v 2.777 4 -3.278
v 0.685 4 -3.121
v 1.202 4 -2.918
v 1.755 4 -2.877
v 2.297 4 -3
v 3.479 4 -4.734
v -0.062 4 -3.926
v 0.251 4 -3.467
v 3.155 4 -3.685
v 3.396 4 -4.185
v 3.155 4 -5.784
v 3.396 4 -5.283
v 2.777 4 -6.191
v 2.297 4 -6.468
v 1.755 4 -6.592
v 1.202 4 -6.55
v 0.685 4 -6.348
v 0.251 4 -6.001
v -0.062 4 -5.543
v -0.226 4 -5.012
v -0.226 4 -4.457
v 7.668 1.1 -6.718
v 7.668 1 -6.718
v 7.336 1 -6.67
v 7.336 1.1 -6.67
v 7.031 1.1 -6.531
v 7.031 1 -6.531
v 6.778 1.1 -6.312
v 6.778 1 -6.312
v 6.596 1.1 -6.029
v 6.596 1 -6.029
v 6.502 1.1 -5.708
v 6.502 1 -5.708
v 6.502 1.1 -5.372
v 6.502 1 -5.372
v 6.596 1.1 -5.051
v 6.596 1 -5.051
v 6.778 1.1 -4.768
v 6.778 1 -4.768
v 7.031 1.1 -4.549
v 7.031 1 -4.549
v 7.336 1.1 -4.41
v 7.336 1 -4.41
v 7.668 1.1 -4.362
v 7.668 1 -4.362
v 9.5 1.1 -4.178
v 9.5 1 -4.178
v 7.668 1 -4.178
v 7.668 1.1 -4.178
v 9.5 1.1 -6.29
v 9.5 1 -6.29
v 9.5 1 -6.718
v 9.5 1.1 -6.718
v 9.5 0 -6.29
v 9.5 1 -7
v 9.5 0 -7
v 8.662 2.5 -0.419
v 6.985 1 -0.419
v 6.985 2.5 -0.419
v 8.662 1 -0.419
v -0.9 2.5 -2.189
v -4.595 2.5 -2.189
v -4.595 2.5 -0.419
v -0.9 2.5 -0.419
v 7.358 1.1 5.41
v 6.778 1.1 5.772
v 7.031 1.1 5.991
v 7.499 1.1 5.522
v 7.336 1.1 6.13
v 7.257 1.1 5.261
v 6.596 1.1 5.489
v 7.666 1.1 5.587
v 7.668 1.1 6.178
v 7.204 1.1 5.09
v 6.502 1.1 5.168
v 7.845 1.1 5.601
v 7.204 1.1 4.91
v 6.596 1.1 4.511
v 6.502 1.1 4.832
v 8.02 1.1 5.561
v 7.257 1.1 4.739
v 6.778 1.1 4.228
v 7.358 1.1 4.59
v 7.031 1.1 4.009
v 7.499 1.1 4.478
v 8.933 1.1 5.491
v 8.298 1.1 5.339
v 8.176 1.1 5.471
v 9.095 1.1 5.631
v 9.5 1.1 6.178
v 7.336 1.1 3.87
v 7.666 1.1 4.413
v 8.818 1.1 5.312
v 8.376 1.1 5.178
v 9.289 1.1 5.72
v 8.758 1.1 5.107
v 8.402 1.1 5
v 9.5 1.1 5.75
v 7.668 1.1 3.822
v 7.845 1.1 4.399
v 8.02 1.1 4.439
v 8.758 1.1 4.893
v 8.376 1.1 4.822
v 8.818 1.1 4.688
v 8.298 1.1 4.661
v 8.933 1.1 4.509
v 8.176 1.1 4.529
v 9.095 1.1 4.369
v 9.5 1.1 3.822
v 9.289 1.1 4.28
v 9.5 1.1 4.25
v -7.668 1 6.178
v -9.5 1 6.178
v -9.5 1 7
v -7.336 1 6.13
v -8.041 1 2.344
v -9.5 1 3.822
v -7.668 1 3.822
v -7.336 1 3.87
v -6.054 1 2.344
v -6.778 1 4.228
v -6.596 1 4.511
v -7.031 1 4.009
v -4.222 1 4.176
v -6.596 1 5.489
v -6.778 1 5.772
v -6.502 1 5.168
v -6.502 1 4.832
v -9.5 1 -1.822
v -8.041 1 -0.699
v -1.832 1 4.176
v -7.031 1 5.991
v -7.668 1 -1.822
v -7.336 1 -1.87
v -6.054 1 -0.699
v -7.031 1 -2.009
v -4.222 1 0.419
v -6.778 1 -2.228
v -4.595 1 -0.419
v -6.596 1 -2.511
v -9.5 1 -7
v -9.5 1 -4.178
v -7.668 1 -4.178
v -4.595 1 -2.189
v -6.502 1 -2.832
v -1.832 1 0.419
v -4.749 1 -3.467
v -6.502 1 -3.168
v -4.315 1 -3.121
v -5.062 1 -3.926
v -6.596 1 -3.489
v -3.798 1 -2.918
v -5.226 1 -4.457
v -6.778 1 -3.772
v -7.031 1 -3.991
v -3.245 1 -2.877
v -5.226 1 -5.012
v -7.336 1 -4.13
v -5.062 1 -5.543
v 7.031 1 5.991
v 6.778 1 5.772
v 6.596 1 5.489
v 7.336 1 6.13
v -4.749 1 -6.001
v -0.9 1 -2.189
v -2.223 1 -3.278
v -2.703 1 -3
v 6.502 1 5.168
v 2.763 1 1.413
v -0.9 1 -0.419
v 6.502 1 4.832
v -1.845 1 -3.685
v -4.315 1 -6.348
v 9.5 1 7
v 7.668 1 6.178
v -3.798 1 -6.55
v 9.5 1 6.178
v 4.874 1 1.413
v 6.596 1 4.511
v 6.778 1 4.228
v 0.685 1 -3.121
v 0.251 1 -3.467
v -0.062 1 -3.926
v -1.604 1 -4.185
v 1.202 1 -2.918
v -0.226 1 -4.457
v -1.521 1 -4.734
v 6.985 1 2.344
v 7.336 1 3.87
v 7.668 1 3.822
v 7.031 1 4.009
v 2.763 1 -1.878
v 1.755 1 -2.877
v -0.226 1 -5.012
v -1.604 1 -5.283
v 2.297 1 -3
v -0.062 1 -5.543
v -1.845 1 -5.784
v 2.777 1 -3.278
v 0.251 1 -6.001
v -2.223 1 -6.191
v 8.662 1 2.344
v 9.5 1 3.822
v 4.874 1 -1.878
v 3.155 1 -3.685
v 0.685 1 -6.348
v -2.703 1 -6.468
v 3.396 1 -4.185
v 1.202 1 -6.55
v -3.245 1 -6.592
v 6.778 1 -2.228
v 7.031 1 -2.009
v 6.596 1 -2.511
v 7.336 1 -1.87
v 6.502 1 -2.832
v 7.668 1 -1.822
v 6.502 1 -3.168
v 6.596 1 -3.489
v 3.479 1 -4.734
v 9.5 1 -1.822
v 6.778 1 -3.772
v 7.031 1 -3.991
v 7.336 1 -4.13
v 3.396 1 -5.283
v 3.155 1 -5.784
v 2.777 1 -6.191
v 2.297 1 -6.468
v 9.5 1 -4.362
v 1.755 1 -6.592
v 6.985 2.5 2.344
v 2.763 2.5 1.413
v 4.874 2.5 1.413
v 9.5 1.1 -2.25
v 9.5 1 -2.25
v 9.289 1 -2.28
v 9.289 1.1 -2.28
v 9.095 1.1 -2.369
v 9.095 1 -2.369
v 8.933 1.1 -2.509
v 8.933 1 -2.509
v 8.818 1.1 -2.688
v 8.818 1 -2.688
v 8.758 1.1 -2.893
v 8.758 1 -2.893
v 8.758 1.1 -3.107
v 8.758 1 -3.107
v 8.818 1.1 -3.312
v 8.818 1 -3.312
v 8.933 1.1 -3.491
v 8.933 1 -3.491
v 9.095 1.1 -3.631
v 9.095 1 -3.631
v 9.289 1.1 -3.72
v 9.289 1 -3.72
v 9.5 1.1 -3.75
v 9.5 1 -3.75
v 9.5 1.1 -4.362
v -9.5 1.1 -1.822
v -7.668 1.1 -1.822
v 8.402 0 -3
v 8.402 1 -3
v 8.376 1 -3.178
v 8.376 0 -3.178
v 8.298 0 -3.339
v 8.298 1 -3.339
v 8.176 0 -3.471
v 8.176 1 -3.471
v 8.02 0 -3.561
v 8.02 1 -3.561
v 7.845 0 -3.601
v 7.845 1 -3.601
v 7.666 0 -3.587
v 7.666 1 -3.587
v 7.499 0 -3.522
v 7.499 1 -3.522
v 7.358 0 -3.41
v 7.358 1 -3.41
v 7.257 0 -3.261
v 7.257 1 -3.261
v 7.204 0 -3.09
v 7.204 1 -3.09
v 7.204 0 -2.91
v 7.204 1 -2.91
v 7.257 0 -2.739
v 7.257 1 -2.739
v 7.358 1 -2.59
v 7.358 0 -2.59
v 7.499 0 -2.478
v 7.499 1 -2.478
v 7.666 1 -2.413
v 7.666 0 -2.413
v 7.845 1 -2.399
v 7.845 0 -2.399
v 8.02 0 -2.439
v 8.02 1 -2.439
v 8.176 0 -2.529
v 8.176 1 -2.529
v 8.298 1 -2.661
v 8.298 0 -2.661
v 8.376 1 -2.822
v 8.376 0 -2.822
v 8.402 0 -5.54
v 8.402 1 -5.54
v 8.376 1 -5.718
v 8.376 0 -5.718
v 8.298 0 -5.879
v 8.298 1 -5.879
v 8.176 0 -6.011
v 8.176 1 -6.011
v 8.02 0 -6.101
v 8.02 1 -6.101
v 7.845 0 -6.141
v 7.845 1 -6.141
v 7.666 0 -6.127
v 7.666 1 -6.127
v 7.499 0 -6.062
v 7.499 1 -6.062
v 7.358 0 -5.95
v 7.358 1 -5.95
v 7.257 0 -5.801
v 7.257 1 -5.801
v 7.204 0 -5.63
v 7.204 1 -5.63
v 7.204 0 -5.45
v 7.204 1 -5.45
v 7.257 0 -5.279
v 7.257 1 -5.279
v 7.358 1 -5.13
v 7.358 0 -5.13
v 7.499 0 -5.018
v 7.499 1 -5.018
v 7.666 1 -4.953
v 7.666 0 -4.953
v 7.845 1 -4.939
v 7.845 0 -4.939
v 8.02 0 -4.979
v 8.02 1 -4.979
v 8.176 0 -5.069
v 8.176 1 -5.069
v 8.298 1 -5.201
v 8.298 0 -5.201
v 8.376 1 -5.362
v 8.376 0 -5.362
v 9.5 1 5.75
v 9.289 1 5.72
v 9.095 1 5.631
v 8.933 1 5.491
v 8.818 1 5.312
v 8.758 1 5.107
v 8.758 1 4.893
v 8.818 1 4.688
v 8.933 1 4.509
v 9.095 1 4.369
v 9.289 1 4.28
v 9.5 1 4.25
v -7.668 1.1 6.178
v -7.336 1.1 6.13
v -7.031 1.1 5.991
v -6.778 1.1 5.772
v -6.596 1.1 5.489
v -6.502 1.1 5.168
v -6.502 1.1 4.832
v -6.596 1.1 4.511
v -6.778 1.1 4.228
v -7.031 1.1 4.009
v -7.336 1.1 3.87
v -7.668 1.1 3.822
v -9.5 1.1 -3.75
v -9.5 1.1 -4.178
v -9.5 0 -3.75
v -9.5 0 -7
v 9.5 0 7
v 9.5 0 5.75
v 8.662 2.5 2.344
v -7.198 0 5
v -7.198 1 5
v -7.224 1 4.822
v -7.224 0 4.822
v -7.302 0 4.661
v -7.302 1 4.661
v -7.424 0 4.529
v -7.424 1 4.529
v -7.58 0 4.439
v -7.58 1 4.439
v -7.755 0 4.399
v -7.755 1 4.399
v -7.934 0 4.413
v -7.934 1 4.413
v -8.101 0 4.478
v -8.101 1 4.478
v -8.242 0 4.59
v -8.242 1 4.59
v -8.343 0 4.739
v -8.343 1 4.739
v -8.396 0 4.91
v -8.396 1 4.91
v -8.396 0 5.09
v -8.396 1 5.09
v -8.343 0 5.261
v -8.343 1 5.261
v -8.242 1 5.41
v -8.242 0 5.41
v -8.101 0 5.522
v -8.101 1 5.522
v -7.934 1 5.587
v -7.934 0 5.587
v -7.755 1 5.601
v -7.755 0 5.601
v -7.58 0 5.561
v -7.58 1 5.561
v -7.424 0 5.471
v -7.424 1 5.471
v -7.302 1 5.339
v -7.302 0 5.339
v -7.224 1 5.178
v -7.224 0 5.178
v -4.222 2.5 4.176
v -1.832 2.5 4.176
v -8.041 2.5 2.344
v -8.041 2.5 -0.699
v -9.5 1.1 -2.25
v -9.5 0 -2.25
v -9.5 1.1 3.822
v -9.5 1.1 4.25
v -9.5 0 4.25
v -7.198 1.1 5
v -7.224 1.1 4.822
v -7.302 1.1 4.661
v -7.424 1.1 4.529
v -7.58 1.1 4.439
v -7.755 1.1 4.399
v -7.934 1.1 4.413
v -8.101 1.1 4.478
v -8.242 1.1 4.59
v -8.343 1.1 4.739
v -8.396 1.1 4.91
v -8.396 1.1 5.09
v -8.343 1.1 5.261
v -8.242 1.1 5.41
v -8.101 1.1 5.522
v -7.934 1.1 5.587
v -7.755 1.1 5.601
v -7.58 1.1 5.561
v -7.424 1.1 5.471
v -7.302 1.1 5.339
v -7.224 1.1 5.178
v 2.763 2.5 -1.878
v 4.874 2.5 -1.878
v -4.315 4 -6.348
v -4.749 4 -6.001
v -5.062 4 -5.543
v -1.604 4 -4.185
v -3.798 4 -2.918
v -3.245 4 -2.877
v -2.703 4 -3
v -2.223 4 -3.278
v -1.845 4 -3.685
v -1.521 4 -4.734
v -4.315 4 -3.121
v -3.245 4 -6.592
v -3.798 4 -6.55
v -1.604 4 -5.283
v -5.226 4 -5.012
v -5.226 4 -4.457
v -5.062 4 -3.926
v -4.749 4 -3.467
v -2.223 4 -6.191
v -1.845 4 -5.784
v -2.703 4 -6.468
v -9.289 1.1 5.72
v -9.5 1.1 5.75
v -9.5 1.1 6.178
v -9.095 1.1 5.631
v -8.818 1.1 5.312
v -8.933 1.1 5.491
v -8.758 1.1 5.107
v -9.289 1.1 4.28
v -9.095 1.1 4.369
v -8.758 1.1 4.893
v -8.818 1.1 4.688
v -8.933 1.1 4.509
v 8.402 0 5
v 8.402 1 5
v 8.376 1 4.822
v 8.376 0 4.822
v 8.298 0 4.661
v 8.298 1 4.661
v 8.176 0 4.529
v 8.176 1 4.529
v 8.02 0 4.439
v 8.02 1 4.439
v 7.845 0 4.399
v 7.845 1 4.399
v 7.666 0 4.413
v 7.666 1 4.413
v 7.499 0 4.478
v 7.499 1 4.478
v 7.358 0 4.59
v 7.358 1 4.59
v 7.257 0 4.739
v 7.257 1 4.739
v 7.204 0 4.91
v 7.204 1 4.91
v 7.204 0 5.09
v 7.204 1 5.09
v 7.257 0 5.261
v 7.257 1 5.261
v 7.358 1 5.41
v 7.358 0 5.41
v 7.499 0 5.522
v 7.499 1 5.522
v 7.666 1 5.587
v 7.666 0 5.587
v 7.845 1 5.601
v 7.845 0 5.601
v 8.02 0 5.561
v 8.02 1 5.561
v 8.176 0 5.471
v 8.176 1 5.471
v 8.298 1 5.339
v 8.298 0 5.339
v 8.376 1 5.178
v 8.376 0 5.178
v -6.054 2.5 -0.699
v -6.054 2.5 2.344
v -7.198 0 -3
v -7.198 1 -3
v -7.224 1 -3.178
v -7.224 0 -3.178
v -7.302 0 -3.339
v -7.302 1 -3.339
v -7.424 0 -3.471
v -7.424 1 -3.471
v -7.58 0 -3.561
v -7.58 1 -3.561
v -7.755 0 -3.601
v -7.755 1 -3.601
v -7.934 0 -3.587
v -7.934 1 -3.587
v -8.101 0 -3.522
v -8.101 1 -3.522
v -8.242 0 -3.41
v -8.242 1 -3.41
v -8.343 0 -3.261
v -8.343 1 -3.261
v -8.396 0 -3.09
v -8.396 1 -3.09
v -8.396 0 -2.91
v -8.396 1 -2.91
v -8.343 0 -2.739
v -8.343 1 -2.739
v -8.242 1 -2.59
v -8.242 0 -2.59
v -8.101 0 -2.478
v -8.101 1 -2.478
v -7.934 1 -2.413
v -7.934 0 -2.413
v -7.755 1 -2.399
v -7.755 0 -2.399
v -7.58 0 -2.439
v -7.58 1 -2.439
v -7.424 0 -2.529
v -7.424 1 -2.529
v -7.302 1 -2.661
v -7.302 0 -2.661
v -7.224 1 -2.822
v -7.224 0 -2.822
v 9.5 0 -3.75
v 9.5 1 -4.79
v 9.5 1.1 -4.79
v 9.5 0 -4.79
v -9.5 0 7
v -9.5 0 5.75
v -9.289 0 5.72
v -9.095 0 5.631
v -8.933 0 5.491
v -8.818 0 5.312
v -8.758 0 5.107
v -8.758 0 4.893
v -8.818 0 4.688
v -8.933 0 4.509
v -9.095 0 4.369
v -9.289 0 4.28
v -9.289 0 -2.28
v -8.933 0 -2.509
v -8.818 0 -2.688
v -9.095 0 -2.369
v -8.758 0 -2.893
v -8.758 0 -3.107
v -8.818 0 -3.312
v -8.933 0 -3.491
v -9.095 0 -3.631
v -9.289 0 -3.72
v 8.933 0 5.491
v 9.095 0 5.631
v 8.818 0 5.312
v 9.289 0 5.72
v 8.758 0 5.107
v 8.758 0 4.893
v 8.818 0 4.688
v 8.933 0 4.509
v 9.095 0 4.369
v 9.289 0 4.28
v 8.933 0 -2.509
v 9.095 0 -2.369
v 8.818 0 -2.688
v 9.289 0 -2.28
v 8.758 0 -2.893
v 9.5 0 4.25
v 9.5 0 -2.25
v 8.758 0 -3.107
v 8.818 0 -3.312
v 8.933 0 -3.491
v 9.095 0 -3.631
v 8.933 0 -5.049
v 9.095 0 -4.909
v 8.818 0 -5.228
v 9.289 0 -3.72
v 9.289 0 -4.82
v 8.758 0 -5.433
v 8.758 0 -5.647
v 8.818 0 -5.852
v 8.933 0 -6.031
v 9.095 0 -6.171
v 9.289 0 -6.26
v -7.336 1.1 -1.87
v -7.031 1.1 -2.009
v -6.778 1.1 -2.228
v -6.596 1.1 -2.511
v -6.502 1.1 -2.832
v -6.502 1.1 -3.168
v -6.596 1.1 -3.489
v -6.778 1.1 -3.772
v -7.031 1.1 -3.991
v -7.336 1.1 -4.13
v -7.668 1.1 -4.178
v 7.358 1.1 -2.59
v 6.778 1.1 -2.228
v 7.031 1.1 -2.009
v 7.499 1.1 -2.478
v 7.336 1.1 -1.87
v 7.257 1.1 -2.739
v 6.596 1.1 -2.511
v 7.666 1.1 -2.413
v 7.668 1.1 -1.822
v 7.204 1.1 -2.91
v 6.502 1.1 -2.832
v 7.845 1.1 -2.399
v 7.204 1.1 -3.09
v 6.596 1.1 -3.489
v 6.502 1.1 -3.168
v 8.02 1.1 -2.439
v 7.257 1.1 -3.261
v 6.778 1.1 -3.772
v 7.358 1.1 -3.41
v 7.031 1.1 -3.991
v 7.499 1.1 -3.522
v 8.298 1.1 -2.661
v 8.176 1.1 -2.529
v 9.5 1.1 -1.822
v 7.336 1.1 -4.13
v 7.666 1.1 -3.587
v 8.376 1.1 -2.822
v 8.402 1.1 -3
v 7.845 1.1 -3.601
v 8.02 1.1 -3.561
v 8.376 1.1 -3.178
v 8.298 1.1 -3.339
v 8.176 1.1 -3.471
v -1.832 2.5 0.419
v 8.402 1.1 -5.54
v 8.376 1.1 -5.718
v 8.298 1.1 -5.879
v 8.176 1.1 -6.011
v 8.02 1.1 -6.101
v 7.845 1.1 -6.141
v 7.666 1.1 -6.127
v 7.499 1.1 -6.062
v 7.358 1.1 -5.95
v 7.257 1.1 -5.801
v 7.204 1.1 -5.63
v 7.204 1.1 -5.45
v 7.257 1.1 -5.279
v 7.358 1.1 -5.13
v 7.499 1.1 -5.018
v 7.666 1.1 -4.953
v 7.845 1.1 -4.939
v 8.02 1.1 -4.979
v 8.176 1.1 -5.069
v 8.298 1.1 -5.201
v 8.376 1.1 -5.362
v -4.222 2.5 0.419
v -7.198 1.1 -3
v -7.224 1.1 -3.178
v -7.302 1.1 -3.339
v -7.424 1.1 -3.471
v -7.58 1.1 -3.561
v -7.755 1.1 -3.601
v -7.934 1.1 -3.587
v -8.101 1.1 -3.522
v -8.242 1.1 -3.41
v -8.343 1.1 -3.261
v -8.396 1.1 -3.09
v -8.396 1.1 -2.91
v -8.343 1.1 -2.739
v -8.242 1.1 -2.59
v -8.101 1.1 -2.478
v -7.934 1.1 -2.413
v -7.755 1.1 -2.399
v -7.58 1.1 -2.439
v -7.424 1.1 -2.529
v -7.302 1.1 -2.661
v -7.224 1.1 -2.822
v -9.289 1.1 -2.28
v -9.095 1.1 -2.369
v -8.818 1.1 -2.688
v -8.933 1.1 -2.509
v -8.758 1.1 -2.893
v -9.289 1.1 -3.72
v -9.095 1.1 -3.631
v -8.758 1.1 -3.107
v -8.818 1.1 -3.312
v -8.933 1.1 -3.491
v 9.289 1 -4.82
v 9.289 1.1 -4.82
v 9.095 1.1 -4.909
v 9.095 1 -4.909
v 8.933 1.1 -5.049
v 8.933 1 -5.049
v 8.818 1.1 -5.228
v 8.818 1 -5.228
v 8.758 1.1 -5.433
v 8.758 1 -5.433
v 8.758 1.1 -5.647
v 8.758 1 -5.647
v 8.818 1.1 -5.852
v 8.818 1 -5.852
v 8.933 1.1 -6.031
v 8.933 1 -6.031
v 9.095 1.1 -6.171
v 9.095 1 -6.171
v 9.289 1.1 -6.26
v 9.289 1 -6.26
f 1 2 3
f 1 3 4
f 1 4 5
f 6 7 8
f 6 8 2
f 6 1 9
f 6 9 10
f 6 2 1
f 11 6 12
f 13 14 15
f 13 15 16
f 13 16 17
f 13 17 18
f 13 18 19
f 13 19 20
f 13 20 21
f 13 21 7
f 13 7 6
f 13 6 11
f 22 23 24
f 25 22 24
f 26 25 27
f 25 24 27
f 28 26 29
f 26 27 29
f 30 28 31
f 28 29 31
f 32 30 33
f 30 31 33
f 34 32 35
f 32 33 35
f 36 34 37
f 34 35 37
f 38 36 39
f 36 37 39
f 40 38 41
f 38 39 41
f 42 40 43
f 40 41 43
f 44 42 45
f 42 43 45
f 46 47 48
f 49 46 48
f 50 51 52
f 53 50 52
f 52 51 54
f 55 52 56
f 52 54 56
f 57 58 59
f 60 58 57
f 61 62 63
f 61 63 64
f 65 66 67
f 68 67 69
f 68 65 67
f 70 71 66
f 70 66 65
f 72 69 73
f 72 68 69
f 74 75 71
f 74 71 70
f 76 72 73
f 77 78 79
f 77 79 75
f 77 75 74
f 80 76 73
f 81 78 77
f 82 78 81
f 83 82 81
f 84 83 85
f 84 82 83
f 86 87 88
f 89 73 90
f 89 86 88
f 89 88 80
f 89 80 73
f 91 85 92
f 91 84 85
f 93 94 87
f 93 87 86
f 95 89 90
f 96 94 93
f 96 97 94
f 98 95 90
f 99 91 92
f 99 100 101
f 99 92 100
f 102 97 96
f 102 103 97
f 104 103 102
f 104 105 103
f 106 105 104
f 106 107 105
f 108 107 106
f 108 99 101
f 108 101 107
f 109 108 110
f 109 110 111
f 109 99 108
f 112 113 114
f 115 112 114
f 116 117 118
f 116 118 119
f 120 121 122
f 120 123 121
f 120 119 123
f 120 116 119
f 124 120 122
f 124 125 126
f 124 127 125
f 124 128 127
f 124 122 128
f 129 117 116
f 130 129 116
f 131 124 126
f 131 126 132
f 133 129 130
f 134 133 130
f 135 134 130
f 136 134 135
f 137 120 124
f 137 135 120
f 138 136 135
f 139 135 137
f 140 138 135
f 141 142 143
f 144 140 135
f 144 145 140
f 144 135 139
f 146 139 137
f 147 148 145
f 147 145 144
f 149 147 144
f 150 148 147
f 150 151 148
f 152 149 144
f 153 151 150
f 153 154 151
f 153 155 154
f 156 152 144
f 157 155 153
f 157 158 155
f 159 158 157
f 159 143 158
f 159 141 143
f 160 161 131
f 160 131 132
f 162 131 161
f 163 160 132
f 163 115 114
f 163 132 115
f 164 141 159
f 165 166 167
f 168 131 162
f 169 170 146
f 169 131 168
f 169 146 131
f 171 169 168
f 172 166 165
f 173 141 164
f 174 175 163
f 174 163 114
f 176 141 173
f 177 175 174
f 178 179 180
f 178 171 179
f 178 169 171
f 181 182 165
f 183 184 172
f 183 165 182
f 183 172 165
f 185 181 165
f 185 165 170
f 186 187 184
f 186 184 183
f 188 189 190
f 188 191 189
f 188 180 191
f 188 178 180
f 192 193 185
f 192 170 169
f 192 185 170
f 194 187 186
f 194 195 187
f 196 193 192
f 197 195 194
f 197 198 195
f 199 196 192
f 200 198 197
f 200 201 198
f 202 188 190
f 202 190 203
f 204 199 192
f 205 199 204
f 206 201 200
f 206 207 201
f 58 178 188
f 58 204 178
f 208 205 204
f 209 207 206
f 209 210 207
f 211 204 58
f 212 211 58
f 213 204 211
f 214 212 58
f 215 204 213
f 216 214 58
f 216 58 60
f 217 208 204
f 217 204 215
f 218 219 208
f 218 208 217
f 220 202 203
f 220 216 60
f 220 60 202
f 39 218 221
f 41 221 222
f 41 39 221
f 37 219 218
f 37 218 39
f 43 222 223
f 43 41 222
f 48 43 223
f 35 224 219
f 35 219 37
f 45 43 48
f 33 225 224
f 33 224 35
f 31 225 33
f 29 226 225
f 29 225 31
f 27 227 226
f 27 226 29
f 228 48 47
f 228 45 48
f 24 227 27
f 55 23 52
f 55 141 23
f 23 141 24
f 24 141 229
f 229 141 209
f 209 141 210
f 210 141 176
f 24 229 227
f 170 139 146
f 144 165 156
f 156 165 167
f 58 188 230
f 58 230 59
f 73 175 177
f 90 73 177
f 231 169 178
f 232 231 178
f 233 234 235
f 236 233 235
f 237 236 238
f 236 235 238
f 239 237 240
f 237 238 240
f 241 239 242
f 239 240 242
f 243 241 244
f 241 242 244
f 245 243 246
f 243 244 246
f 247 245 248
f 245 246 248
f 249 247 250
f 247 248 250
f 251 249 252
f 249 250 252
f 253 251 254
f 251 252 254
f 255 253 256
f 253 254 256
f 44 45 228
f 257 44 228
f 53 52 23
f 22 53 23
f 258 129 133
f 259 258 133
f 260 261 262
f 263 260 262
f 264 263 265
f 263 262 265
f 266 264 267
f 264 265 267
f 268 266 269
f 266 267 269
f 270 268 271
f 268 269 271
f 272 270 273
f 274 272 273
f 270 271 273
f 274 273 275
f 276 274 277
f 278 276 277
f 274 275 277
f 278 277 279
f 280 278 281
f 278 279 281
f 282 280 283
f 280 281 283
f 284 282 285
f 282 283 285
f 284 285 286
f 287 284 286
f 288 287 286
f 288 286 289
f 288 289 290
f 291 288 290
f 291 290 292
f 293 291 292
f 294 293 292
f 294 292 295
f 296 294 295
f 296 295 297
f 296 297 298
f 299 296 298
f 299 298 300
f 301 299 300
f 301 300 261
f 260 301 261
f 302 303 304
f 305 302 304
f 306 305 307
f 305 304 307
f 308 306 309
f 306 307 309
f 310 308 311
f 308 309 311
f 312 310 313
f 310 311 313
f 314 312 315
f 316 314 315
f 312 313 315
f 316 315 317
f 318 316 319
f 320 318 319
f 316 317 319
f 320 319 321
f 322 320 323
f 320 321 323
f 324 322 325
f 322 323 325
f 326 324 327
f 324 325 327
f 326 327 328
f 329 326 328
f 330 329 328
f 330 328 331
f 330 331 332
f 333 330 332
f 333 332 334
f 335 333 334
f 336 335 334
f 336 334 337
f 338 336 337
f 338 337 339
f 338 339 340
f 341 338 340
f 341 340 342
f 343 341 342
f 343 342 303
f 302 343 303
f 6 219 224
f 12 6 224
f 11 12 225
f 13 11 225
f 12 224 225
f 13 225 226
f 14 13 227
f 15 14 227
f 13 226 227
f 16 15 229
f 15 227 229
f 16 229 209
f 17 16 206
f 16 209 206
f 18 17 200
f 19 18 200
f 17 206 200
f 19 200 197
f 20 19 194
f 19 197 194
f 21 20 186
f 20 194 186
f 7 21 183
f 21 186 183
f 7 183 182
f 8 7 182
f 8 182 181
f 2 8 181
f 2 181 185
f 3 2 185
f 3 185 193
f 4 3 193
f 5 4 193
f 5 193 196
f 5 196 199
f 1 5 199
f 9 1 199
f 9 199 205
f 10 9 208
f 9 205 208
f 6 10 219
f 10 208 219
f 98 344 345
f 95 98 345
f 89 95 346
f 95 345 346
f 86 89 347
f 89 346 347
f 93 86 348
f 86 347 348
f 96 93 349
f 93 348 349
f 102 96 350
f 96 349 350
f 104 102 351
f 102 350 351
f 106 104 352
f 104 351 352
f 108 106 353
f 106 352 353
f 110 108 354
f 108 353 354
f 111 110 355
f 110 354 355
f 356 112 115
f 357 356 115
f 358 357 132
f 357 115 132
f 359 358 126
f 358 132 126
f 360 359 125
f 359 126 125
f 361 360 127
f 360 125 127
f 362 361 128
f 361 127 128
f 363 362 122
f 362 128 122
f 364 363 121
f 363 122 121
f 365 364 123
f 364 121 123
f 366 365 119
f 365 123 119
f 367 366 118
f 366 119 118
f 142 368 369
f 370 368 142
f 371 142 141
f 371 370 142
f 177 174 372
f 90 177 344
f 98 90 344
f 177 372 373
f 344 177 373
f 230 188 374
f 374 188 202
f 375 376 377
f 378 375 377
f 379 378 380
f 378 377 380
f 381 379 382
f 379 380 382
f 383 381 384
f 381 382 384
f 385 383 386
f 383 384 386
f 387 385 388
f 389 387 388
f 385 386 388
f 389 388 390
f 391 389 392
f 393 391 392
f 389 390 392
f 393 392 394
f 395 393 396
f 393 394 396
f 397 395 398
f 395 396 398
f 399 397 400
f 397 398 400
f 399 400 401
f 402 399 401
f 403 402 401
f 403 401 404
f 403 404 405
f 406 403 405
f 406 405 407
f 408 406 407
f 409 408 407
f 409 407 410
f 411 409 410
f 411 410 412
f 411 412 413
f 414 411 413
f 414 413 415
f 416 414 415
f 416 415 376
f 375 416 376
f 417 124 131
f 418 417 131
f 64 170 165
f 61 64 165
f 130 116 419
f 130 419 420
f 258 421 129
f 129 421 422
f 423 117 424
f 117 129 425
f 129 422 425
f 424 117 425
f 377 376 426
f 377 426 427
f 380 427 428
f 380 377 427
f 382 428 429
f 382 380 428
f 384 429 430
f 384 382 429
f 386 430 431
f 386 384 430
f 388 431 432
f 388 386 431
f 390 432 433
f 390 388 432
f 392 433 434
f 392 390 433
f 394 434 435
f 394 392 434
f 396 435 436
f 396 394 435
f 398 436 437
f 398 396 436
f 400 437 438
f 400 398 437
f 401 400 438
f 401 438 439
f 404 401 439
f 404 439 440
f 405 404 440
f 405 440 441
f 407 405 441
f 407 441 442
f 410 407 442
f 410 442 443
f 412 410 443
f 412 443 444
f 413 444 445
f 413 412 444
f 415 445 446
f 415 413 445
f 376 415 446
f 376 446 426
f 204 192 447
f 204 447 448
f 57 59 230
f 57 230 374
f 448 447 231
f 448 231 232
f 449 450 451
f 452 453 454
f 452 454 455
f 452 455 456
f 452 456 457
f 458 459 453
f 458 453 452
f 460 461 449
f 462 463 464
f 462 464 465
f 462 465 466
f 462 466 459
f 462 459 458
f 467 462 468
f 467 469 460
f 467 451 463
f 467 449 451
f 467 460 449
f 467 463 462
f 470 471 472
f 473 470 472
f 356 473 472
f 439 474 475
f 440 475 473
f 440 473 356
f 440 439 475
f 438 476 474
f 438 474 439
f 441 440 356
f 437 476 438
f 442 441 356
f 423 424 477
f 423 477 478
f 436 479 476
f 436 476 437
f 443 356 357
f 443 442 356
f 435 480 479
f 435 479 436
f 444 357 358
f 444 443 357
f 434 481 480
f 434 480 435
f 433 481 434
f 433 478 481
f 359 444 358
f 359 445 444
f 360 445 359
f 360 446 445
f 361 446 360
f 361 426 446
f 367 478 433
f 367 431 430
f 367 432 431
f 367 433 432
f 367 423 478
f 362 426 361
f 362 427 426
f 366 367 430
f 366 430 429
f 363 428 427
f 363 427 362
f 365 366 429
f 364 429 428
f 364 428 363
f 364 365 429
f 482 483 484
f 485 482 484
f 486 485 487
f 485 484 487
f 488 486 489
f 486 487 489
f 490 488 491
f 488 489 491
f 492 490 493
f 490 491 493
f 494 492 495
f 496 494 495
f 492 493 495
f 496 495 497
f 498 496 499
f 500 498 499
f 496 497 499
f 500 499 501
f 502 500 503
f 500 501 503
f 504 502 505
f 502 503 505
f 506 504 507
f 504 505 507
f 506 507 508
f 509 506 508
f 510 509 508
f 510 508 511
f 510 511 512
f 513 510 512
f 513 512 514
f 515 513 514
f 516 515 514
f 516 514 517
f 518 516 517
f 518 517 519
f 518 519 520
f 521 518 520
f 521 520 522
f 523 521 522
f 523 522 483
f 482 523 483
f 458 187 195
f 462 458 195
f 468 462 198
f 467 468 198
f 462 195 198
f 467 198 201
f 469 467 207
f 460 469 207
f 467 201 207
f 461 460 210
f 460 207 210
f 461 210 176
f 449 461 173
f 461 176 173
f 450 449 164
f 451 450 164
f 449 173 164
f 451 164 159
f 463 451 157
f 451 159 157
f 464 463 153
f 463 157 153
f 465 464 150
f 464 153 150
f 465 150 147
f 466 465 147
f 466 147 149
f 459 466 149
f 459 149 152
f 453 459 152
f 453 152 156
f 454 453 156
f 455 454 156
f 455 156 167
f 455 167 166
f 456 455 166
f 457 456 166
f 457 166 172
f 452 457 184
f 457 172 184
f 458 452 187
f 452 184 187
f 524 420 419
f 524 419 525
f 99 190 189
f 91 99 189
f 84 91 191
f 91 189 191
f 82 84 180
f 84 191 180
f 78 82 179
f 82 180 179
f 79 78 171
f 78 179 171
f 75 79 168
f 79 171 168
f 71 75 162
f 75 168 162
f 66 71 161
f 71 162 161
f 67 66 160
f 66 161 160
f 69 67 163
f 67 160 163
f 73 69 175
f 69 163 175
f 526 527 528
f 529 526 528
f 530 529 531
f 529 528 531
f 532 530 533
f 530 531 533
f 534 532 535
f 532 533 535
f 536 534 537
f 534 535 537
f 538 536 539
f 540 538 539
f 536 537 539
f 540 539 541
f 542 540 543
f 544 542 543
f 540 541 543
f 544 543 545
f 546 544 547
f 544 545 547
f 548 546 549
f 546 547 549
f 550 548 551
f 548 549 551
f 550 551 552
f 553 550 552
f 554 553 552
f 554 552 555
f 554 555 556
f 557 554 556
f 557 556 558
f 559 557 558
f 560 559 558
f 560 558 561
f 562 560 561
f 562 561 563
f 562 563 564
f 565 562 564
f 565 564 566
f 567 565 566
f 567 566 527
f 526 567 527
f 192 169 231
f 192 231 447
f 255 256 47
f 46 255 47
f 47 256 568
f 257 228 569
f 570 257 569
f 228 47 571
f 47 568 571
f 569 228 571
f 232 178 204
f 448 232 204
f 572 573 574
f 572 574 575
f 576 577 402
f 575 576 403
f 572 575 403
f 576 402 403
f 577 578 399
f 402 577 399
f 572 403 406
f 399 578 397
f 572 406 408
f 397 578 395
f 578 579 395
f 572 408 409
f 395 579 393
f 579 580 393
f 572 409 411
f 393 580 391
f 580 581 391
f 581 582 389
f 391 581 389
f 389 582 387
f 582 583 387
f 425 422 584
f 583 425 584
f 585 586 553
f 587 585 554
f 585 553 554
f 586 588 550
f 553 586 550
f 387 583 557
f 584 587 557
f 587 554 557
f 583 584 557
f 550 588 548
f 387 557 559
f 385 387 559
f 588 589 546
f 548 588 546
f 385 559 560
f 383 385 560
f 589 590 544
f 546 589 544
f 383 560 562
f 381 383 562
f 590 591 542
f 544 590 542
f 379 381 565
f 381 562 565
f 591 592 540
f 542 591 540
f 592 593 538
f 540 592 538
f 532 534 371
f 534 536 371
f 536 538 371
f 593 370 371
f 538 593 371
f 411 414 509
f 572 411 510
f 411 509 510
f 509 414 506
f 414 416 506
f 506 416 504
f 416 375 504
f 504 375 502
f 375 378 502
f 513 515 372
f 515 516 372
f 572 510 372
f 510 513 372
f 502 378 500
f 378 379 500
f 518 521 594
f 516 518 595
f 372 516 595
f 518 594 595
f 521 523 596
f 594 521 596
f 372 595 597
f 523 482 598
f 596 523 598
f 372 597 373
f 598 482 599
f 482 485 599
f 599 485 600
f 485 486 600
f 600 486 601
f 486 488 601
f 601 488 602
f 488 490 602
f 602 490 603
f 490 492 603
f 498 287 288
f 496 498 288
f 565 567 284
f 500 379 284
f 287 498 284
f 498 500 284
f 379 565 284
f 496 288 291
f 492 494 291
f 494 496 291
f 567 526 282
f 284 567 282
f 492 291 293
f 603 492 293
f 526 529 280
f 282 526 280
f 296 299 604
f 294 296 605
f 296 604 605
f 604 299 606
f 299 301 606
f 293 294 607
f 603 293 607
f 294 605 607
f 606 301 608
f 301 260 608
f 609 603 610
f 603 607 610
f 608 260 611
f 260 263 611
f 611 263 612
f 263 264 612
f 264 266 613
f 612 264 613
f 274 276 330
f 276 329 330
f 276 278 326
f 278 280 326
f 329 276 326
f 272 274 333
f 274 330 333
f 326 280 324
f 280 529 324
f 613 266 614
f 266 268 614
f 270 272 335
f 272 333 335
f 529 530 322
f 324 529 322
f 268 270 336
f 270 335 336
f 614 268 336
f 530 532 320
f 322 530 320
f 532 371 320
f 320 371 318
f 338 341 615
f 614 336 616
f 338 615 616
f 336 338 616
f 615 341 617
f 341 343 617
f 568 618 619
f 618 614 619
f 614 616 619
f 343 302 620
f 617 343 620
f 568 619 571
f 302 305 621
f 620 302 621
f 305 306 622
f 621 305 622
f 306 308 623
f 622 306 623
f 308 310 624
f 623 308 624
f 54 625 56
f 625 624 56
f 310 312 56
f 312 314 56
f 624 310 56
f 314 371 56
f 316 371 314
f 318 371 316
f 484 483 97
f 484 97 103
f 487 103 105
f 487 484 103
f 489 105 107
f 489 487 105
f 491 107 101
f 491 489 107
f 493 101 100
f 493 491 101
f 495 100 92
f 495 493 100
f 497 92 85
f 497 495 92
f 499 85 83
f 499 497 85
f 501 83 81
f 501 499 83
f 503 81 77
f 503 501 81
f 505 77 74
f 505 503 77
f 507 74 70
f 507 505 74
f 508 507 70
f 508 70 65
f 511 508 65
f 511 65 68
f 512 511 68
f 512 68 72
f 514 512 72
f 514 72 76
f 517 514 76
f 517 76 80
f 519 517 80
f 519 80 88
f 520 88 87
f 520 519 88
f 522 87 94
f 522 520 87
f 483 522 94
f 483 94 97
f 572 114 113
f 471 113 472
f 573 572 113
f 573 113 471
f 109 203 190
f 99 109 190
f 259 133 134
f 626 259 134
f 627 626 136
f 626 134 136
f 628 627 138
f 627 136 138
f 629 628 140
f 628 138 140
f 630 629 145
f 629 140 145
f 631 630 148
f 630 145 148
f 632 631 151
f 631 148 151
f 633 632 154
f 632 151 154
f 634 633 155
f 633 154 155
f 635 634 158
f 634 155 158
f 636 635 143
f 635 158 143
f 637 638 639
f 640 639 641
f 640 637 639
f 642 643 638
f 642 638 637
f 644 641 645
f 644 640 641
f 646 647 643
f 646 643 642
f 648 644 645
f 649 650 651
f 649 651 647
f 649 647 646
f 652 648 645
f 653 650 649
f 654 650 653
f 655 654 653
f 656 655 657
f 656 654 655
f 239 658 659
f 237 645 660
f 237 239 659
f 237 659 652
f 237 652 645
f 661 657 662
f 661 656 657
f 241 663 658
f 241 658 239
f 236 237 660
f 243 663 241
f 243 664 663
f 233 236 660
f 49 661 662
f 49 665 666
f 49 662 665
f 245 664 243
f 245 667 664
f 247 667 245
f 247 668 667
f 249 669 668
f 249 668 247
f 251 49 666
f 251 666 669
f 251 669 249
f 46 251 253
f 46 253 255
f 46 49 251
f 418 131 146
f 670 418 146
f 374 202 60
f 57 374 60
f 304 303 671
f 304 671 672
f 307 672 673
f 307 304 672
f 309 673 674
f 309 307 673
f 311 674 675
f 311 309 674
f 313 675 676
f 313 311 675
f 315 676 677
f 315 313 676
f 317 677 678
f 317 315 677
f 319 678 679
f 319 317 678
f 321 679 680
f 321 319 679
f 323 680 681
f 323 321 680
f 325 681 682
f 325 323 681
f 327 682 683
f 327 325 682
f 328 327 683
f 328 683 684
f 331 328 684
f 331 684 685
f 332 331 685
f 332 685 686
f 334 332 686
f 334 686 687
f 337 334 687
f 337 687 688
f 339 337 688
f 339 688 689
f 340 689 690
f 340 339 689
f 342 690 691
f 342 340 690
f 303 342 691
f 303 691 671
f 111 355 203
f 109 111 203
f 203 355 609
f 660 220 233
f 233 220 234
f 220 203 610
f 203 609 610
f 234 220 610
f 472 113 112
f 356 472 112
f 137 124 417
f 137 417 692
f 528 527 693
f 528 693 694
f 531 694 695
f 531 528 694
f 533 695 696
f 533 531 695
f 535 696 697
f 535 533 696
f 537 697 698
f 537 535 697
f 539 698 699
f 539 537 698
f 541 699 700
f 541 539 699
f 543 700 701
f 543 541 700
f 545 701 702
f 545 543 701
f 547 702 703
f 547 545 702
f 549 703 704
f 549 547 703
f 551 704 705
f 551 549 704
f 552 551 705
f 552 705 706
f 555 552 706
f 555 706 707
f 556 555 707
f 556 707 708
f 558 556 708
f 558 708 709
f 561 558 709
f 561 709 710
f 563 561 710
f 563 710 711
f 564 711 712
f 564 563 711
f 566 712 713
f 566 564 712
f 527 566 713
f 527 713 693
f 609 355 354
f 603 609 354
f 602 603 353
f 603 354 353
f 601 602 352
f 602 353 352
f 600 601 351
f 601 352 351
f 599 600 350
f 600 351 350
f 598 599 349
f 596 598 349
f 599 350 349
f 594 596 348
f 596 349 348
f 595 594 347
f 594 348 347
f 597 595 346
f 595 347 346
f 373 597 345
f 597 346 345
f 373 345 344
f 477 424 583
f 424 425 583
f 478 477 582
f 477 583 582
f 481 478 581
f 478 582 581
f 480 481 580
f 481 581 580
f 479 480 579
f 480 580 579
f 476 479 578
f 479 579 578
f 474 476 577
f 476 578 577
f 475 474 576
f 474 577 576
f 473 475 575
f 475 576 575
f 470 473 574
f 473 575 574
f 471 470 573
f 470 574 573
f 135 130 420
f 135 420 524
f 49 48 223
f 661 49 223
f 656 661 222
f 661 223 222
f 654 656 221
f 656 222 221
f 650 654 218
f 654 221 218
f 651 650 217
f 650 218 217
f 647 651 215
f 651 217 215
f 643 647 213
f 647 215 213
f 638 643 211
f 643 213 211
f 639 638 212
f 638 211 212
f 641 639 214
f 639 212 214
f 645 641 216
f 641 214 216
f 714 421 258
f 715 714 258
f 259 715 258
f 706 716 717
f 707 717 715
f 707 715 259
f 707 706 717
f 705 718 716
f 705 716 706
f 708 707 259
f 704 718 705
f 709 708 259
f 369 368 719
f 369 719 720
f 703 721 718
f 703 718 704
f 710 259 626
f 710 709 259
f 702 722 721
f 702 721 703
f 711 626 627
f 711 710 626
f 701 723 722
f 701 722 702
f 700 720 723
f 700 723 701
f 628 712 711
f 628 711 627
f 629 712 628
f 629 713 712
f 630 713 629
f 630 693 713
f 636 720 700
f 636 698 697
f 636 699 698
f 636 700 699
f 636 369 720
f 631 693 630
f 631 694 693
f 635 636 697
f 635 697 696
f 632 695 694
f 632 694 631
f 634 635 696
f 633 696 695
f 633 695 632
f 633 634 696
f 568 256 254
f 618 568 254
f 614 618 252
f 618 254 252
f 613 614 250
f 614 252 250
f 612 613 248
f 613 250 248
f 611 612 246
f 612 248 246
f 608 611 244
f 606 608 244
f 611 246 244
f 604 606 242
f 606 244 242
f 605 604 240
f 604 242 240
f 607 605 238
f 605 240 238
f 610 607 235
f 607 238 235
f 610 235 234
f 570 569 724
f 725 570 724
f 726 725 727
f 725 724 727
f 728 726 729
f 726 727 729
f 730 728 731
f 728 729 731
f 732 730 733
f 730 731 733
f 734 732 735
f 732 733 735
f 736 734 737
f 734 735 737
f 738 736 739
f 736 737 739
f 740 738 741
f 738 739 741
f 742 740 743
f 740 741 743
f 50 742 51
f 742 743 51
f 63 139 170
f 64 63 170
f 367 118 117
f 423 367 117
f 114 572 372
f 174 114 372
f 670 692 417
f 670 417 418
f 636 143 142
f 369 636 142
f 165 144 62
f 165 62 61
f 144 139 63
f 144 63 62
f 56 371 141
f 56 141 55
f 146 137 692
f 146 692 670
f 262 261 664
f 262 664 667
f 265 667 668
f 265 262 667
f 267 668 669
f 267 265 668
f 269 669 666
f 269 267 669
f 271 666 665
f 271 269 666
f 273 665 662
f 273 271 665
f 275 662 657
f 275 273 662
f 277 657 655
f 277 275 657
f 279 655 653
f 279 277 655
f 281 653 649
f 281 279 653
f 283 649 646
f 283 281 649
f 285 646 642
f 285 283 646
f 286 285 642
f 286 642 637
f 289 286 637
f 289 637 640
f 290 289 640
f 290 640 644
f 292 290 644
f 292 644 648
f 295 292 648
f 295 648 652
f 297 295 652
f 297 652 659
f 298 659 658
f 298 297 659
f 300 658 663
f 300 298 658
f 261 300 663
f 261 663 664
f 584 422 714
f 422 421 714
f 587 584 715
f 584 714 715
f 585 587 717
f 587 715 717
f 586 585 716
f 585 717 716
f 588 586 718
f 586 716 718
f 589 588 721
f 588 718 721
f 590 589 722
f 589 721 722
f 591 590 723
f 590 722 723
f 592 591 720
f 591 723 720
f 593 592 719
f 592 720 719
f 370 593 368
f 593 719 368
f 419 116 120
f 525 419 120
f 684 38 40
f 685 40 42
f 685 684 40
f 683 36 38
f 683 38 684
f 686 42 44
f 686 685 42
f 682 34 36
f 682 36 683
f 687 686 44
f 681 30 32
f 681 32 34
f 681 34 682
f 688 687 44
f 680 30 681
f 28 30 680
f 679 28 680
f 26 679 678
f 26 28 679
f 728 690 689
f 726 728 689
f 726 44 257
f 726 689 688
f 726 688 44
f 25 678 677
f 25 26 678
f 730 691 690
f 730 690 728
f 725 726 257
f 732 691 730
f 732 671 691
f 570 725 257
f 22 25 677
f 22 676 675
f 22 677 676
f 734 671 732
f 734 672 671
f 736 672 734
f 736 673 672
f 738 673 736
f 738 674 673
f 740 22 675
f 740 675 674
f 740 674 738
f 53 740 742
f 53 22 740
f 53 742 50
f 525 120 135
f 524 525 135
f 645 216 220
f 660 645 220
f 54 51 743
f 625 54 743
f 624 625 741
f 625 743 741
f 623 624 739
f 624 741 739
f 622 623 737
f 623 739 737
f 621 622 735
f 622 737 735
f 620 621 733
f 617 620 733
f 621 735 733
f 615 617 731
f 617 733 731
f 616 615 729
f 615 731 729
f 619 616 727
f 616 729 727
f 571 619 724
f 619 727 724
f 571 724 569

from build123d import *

# Parameters (mm, degrees)
SKETCH_1_W          = 19
SKETCH_1_H          = 14
EXTRUDE_1_DEPTH     = 1
SKETCH_2_R          = 0.75
SKETCH_2_R_2        = 0.602396592
CUT_EXTRUDE_1_DEPTH = 2
SKETCH_4_R          = 1.862700745
EXTRUDE_2_DEPTH     = 3
SKETCH_3_R          = 0.602396592
EXTRUDE_3_DEPTH     = 0.1
SKETCH_5_W          = 2.390465956
SKETCH_5_H          = 3.756446502
SKETCH_5_W_2        = 2.111060845
SKETCH_5_H_2        = 3.290771316
SKETCH_5_W_3        = 1.986880794
SKETCH_5_H_3        = 3.042411217
SKETCH_5_W_4        = 3.694356478
SKETCH_5_H_4        = 1.769565707
SKETCH_5_W_5        = 1.676430671
SKETCH_5_H_5        = 2.763006106
EXTRUDE_4_DEPTH     = 1.5


with BuildPart() as part:
    # Эскиз1 → Бобышка-Вытянуть1 (new body)
    with BuildSketch(Plane(origin=(0, 0, 0), x_dir=(1, 0, 0), z_dir=(0, 1, 0))):
        Rectangle(SKETCH_1_W, SKETCH_1_H)
    extrude(amount=EXTRUDE_1_DEPTH)

    # Эскиз2 → Вырез-Вытянуть1 (cut, through all)
    with BuildSketch(Plane(origin=(0, 1, 0), x_dir=(1, 0, 0), z_dir=(0, 1, 0))):
        with Locations((-9.5, -5)):
            Circle(SKETCH_2_R)
        with Locations((-9.5, 3)):
            Circle(SKETCH_2_R)
        with Locations((9.5, 3)):
            Circle(SKETCH_2_R)
        with Locations((9.5, -5)):
            Circle(SKETCH_2_R)
        with Locations((9.5, 5.54)):
            Circle(SKETCH_2_R)
        with Locations((-7.8, 3)):
            Circle(SKETCH_2_R_2)
        with Locations((-7.8, -5)):
            Circle(SKETCH_2_R_2)
        with Locations((7.8, 3)):
            Circle(SKETCH_2_R_2)
        with Locations((7.8, -5)):
            Circle(SKETCH_2_R_2)
        with Locations((7.8, 5.54)):
            Circle(SKETCH_2_R_2)
    extrude(amount=-CUT_EXTRUDE_1_DEPTH, mode=Mode.SUBTRACT)

    # Эскиз4 → Бобышка-Вытянуть2 (add)
    with BuildSketch(Plane(origin=(0, 1, 0), x_dir=(1, 0, 0), z_dir=(0, 1, 0))):
        with Locations((-3.383906354, 4.734364394)):
            Circle(SKETCH_4_R)
        with Locations((1.616093646, 4.734364394)):
            Circle(SKETCH_4_R)
    extrude(amount=EXTRUDE_2_DEPTH)

    # Эскиз3 → Бобышка-Вытянуть3 (add)
    with BuildSketch(Plane(origin=(0, 1, 0), x_dir=(1, 0, 0), z_dir=(0, 1, 0))):
        with BuildLine():
            Line((-7.668118067, -3.821776661), (-9.5, -3.821776661))
            Line((-9.5, -3.821776661), (-9.5, -4.25))
            ThreePointArc((-9.5, -4.25), (-8.75, -5), (-9.5, -5.75))
            Line((-9.5, -5.75), (-9.5, -6.178223339))
            Line((-9.5, -6.178223339), (-7.668118067, -6.178223339))
            ThreePointArc((-7.668118067, -6.178223339), (-6.489894728, -5), (-7.668118067, -3.821776661))
        make_face()
        with Locations((-7.8, -5)):
            Circle(SKETCH_3_R, mode=Mode.SUBTRACT)
        with BuildLine():
            Line((-9.5, 2.25), (-9.5, 1.821776661))
            Line((-9.5, 1.821776661), (-7.668118067, 1.821776661))
            ThreePointArc((-7.668118067, 1.821776661), (-6.489894728, 3), (-7.668118067, 4.178223339))
            Line((-7.668118067, 4.178223339), (-9.5, 4.178223339))
            Line((-9.5, 4.178223339), (-9.5, 3.75))
            ThreePointArc((-9.5, 3.75), (-8.75, 3), (-9.5, 2.25))
        make_face()
        with Locations((-7.8, 3)):
            Circle(SKETCH_3_R, mode=Mode.SUBTRACT)
        with BuildLine():
            Line((7.668118067, -6.178223339), (9.5, -6.178223339))
            Line((9.5, -6.178223339), (9.5, -5.75))
            ThreePointArc((9.5, -5.75), (8.75, -5), (9.5, -4.25))
            Line((9.5, -4.25), (9.5, -3.821776661))
            Line((9.5, -3.821776661), (7.668118067, -3.821776661))
            ThreePointArc((7.668118067, -3.821776661), (6.489894728, -5), (7.668118067, -6.178223339))
        make_face()
        with Locations((7.8, -5)):
            Circle(SKETCH_3_R, mode=Mode.SUBTRACT)
        with BuildLine():
            Line((9.5, 6.29), (9.5, 6.718223339))
            Line((9.5, 6.718223339), (7.668118067, 6.718223339))
            ThreePointArc((7.668118067, 6.718223339), (6.489894728, 5.54), (7.668118067, 4.361776661))
            Line((7.668118067, 4.361776661), (9.5, 4.361776661))
            Line((9.5, 4.361776661), (9.5, 4.79))
            ThreePointArc((9.5, 4.79), (8.75, 5.54), (9.5, 6.29))
        make_face()
        with Locations((7.8, 5.54)):
            Circle(SKETCH_3_R, mode=Mode.SUBTRACT)
        with BuildLine():
            Line((7.668118067, 1.821776661), (9.5, 1.821776661))
            Line((9.5, 1.821776661), (9.5, 2.25))
            ThreePointArc((9.5, 2.25), (8.75, 3), (9.5, 3.75))
            Line((9.5, 3.75), (9.5, 4.178223339))
            Line((9.5, 4.178223339), (7.668118067, 4.178223339))
            ThreePointArc((7.668118067, 4.178223339), (6.489894728, 3), (7.668118067, 1.821776661))
        make_face()
        with Locations((7.8, 3)):
            Circle(SKETCH_3_R, mode=Mode.SUBTRACT)
    extrude(amount=EXTRUDE_3_DEPTH)

    # Эскиз5 → Бобышка-Вытянуть4 (add)
    with BuildSketch(Plane(origin=(0, 1, 0), x_dir=(1, 0, 0), z_dir=(0, 1, 0))):
        with Locations((-3.026888711, -2.297330919)):
            Rectangle(SKETCH_5_W, SKETCH_5_H)
        with Locations((3.818536528, 0.232837593)):
            Rectangle(SKETCH_5_W_2, SKETCH_5_H_2)
        with Locations((-7.047217819, -0.82269283)):
            Rectangle(SKETCH_5_W_3, SKETCH_5_H_3)
        with Locations((-2.747483599, 1.303890522)):
            Rectangle(SKETCH_5_W_4, SKETCH_5_H_4)
        with Locations((7.82334313, -0.962395385)):
            Rectangle(SKETCH_5_W_5, SKETCH_5_H_5)
    extrude(amount=EXTRUDE_4_DEPTH)


solid = part.part
